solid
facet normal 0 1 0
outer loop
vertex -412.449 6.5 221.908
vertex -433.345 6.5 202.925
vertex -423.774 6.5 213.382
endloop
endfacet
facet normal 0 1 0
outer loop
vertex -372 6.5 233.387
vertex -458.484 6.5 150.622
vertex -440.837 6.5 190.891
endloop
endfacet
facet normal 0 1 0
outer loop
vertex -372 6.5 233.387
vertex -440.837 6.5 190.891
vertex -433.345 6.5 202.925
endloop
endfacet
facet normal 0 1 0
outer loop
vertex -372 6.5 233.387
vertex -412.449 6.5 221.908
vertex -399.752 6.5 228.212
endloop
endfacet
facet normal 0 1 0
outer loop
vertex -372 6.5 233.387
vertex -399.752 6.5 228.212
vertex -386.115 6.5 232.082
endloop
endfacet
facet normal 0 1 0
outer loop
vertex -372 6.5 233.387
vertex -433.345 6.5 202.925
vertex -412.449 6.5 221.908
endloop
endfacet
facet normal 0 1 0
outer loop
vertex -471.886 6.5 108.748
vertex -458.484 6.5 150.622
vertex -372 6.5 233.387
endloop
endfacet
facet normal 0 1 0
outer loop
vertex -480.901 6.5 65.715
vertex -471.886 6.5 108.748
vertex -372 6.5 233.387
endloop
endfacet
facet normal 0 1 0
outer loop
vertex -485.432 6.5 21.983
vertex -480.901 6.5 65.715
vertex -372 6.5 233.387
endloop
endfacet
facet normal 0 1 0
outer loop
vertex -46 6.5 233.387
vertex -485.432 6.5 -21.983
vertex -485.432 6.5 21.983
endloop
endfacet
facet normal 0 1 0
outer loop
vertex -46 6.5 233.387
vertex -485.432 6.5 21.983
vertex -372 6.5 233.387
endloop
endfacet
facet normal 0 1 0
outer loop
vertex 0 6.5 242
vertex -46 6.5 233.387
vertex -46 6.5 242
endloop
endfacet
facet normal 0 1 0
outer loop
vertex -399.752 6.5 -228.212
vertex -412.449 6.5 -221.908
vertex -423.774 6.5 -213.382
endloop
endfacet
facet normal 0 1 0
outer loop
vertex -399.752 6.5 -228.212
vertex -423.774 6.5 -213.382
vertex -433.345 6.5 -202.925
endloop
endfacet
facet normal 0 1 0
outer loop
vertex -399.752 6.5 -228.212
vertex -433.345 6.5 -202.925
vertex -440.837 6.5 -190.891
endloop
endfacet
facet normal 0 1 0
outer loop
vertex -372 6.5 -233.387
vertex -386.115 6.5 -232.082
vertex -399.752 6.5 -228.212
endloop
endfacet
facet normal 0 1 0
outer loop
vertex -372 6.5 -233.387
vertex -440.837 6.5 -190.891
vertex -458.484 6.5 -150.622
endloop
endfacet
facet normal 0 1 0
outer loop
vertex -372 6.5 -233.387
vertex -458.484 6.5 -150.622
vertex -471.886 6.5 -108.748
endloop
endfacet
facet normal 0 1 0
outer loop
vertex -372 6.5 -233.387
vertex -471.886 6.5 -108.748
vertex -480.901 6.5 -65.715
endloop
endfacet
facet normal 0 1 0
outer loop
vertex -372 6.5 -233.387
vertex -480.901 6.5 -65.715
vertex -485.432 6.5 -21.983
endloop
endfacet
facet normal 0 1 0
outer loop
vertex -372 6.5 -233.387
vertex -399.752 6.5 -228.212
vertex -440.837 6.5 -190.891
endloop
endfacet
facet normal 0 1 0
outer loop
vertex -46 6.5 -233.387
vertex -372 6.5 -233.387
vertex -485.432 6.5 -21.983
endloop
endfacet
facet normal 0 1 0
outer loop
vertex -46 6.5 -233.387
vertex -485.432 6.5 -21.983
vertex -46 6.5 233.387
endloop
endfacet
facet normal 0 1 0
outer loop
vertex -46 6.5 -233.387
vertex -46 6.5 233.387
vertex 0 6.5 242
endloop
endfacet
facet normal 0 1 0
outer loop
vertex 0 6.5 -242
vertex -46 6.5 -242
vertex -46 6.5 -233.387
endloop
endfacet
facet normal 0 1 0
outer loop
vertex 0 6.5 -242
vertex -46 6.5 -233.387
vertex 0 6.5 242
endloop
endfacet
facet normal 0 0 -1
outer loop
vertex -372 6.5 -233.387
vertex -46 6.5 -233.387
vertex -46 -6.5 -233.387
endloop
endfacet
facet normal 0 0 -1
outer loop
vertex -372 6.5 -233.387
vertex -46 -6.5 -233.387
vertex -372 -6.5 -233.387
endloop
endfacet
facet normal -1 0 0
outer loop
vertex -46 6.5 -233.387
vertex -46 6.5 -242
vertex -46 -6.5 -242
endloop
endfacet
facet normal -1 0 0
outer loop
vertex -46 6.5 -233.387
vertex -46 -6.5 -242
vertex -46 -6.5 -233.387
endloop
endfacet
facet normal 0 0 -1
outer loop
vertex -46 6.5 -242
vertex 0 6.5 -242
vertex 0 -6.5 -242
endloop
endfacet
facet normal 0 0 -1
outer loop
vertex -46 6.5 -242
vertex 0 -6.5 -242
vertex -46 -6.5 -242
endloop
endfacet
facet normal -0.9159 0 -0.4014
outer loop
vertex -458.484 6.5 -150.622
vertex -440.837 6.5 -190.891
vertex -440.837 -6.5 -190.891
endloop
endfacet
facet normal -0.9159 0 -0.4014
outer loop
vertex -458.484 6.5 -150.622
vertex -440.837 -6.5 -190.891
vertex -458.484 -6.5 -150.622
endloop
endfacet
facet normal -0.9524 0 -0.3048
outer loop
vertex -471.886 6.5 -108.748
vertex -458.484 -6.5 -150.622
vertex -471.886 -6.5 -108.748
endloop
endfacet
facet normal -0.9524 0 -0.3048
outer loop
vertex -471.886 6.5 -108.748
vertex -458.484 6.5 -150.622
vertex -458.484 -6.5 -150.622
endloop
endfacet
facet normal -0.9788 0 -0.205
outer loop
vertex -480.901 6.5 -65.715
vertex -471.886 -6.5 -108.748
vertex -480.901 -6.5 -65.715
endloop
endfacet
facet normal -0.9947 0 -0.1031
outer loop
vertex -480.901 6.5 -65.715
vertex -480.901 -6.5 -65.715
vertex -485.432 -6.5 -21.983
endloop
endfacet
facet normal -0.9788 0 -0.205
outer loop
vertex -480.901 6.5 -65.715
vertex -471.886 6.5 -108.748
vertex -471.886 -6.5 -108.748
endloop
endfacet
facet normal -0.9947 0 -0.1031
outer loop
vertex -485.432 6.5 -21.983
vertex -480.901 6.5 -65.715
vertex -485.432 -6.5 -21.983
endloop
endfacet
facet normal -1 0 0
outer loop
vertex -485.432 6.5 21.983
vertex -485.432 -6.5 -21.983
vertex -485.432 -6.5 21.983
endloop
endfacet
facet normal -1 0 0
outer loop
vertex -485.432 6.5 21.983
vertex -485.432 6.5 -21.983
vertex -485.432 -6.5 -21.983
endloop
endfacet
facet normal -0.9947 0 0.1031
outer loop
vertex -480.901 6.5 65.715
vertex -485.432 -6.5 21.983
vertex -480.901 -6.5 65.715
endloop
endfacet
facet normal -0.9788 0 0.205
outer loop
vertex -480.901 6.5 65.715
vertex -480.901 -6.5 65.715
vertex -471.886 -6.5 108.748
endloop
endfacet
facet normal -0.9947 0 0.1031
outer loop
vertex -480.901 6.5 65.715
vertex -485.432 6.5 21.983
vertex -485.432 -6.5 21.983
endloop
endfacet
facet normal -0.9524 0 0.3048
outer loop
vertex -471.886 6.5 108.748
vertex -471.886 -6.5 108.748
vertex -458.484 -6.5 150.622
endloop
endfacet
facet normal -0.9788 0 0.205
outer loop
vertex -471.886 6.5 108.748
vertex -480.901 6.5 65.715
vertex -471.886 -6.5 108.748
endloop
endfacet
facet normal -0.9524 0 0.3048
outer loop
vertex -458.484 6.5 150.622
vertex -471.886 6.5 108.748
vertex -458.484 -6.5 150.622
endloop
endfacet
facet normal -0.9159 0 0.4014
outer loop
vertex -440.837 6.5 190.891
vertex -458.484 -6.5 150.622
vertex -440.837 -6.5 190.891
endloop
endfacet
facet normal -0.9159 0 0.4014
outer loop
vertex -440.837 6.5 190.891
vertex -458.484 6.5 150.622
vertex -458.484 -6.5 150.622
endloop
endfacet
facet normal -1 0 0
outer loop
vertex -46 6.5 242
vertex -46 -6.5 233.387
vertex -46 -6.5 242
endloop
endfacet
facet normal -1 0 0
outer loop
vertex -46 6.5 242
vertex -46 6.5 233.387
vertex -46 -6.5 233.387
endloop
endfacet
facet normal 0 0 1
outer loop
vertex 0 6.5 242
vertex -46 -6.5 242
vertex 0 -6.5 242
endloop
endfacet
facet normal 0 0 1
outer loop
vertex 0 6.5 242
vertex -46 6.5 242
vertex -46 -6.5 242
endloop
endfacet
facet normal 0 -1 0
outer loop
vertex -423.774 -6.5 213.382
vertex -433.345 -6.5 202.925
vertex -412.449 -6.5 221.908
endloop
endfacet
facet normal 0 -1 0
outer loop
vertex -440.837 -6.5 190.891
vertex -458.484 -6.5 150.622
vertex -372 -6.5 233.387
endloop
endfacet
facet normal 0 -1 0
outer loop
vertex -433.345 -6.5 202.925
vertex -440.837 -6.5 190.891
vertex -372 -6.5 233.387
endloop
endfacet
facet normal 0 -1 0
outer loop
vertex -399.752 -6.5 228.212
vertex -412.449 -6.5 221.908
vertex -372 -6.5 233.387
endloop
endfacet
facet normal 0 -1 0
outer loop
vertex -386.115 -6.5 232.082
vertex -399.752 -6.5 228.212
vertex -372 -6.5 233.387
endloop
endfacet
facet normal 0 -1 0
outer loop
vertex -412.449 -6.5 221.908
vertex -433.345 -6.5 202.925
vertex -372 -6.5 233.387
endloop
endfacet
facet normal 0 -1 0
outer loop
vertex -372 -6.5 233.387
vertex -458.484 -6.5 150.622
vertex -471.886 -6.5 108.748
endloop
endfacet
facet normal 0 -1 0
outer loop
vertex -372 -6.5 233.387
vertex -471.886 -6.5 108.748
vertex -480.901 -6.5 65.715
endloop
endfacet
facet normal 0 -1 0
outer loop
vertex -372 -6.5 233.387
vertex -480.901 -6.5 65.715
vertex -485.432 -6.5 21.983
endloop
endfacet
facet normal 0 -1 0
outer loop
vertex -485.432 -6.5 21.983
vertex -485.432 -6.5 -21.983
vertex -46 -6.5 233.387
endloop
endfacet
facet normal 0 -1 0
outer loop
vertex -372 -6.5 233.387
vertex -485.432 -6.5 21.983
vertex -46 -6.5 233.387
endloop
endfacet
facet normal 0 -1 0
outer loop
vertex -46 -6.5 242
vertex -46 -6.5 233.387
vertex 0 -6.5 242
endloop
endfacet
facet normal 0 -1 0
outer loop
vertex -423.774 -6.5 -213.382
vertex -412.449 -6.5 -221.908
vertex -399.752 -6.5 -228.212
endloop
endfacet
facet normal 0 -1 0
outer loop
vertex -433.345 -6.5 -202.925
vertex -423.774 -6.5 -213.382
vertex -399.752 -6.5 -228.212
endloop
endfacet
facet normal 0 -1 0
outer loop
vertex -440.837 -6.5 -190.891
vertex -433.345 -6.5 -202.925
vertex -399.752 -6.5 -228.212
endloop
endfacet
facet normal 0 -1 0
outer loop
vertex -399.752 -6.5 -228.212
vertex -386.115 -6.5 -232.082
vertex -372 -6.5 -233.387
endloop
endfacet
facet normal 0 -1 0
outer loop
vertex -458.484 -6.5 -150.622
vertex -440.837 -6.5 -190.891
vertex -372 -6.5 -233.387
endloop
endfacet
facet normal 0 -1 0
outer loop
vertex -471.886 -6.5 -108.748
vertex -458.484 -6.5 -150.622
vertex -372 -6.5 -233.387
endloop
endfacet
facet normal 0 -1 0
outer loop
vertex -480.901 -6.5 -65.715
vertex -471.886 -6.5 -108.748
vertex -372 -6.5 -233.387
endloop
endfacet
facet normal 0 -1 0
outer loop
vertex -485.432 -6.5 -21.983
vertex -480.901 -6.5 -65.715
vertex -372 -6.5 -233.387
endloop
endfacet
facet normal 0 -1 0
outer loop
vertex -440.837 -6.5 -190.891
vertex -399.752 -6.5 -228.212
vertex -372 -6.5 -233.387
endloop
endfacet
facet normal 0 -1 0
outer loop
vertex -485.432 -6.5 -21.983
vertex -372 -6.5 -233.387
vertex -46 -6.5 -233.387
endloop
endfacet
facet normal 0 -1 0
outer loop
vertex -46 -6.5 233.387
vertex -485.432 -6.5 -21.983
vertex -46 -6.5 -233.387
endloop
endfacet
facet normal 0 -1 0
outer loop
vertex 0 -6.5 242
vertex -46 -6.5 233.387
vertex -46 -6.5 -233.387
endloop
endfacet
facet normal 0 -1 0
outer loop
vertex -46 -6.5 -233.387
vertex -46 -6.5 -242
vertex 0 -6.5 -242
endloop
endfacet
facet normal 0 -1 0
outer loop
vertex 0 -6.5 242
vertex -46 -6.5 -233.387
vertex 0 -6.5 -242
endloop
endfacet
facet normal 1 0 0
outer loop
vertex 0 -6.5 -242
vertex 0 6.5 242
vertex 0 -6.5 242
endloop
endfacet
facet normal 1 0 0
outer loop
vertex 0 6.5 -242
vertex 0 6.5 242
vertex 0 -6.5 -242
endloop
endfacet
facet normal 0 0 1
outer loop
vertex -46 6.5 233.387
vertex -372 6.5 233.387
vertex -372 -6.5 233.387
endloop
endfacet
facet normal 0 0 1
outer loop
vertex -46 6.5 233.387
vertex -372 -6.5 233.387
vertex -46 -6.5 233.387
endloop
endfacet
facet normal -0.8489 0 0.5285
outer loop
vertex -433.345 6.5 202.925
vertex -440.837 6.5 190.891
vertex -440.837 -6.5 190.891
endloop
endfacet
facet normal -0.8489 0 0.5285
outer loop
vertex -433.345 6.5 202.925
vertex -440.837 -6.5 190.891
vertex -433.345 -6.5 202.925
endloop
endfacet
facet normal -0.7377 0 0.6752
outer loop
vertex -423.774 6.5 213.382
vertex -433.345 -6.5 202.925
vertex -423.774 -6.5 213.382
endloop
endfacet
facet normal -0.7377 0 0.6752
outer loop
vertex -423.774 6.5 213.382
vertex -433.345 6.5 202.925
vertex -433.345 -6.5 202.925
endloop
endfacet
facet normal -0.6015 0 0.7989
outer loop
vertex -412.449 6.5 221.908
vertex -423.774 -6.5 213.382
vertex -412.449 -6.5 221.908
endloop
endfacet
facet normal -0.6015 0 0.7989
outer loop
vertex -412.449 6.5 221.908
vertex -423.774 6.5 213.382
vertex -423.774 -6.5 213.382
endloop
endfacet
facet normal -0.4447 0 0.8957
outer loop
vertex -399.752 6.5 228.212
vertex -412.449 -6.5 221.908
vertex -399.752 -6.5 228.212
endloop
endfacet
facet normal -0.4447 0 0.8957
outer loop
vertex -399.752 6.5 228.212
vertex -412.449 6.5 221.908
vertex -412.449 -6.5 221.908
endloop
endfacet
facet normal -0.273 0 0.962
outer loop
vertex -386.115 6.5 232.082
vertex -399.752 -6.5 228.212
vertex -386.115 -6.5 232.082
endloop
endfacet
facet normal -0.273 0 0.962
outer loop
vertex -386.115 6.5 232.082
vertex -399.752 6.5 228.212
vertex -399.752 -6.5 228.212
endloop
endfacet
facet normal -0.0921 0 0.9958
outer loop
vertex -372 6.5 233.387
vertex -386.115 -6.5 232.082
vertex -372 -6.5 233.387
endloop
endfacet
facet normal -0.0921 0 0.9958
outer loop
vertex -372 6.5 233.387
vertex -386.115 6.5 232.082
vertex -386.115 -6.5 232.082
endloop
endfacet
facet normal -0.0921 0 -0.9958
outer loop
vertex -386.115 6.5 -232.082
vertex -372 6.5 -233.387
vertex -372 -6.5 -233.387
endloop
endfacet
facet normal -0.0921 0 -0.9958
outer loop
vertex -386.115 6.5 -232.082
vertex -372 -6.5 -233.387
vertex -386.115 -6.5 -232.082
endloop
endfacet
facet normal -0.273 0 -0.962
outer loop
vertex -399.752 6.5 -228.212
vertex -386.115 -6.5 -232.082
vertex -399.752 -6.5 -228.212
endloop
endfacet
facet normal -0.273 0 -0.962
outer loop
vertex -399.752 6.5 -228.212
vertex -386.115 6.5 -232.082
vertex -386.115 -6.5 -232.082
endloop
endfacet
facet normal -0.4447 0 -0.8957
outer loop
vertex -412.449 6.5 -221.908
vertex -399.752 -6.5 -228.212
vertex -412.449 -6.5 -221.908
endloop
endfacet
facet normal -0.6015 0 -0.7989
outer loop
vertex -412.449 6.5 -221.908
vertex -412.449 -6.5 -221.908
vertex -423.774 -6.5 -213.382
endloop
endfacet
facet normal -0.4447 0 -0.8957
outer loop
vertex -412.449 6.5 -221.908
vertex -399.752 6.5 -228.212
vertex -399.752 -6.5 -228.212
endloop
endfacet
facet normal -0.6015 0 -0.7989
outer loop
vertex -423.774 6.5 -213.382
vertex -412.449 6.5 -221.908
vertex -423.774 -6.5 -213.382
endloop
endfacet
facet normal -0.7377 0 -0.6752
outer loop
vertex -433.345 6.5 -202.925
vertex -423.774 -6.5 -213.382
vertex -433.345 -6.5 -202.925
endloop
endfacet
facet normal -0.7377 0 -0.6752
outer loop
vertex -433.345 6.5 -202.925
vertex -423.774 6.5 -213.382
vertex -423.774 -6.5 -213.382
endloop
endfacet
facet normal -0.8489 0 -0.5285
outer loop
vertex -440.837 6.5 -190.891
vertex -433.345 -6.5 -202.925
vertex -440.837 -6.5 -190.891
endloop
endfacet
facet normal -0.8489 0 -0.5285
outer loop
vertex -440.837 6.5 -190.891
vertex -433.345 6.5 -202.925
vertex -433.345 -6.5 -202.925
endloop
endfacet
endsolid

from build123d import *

# Parameters (mm, degrees)
BOSS_EXTRUDE1_DEPTH = 6.5


with BuildPart() as part:
    # Sketch1 → Boss-Extrude1 (new body, symmetric)
    with BuildSketch(Plane(origin=(0, 0, 0), x_dir=(1, 0, 0), z_dir=(0, 1, 0))):
        with BuildLine():
            Line((0, -242), (0, 242))
            Line((0, 242), (-46, 242))
            Line((-46, 242), (-46, 233.387339641))
            Line((-46, 233.387339641), (-372, 233.387339641))
            ThreePointArc((-372, 233.387339641), (-412.448780149, 221.907536408), (-440.836676218, 190.891136639))
            ThreePointArc((-440.836676218, 190.891136639), (-486, 0), (-440.836676218, -190.891136639))
            ThreePointArc((-440.836676218, -190.891136639), (-412.448780149, -221.907536408), (-372, -233.387339641))
            Line((-372, -233.387339641), (-46, -233.387339641))
            Line((-46, -233.387339641), (-46, -242))
            Line((-46, -242), (0, -242))
        make_face()
    extrude(amount=BOSS_EXTRUDE1_DEPTH, both=True)


solid = part.part
